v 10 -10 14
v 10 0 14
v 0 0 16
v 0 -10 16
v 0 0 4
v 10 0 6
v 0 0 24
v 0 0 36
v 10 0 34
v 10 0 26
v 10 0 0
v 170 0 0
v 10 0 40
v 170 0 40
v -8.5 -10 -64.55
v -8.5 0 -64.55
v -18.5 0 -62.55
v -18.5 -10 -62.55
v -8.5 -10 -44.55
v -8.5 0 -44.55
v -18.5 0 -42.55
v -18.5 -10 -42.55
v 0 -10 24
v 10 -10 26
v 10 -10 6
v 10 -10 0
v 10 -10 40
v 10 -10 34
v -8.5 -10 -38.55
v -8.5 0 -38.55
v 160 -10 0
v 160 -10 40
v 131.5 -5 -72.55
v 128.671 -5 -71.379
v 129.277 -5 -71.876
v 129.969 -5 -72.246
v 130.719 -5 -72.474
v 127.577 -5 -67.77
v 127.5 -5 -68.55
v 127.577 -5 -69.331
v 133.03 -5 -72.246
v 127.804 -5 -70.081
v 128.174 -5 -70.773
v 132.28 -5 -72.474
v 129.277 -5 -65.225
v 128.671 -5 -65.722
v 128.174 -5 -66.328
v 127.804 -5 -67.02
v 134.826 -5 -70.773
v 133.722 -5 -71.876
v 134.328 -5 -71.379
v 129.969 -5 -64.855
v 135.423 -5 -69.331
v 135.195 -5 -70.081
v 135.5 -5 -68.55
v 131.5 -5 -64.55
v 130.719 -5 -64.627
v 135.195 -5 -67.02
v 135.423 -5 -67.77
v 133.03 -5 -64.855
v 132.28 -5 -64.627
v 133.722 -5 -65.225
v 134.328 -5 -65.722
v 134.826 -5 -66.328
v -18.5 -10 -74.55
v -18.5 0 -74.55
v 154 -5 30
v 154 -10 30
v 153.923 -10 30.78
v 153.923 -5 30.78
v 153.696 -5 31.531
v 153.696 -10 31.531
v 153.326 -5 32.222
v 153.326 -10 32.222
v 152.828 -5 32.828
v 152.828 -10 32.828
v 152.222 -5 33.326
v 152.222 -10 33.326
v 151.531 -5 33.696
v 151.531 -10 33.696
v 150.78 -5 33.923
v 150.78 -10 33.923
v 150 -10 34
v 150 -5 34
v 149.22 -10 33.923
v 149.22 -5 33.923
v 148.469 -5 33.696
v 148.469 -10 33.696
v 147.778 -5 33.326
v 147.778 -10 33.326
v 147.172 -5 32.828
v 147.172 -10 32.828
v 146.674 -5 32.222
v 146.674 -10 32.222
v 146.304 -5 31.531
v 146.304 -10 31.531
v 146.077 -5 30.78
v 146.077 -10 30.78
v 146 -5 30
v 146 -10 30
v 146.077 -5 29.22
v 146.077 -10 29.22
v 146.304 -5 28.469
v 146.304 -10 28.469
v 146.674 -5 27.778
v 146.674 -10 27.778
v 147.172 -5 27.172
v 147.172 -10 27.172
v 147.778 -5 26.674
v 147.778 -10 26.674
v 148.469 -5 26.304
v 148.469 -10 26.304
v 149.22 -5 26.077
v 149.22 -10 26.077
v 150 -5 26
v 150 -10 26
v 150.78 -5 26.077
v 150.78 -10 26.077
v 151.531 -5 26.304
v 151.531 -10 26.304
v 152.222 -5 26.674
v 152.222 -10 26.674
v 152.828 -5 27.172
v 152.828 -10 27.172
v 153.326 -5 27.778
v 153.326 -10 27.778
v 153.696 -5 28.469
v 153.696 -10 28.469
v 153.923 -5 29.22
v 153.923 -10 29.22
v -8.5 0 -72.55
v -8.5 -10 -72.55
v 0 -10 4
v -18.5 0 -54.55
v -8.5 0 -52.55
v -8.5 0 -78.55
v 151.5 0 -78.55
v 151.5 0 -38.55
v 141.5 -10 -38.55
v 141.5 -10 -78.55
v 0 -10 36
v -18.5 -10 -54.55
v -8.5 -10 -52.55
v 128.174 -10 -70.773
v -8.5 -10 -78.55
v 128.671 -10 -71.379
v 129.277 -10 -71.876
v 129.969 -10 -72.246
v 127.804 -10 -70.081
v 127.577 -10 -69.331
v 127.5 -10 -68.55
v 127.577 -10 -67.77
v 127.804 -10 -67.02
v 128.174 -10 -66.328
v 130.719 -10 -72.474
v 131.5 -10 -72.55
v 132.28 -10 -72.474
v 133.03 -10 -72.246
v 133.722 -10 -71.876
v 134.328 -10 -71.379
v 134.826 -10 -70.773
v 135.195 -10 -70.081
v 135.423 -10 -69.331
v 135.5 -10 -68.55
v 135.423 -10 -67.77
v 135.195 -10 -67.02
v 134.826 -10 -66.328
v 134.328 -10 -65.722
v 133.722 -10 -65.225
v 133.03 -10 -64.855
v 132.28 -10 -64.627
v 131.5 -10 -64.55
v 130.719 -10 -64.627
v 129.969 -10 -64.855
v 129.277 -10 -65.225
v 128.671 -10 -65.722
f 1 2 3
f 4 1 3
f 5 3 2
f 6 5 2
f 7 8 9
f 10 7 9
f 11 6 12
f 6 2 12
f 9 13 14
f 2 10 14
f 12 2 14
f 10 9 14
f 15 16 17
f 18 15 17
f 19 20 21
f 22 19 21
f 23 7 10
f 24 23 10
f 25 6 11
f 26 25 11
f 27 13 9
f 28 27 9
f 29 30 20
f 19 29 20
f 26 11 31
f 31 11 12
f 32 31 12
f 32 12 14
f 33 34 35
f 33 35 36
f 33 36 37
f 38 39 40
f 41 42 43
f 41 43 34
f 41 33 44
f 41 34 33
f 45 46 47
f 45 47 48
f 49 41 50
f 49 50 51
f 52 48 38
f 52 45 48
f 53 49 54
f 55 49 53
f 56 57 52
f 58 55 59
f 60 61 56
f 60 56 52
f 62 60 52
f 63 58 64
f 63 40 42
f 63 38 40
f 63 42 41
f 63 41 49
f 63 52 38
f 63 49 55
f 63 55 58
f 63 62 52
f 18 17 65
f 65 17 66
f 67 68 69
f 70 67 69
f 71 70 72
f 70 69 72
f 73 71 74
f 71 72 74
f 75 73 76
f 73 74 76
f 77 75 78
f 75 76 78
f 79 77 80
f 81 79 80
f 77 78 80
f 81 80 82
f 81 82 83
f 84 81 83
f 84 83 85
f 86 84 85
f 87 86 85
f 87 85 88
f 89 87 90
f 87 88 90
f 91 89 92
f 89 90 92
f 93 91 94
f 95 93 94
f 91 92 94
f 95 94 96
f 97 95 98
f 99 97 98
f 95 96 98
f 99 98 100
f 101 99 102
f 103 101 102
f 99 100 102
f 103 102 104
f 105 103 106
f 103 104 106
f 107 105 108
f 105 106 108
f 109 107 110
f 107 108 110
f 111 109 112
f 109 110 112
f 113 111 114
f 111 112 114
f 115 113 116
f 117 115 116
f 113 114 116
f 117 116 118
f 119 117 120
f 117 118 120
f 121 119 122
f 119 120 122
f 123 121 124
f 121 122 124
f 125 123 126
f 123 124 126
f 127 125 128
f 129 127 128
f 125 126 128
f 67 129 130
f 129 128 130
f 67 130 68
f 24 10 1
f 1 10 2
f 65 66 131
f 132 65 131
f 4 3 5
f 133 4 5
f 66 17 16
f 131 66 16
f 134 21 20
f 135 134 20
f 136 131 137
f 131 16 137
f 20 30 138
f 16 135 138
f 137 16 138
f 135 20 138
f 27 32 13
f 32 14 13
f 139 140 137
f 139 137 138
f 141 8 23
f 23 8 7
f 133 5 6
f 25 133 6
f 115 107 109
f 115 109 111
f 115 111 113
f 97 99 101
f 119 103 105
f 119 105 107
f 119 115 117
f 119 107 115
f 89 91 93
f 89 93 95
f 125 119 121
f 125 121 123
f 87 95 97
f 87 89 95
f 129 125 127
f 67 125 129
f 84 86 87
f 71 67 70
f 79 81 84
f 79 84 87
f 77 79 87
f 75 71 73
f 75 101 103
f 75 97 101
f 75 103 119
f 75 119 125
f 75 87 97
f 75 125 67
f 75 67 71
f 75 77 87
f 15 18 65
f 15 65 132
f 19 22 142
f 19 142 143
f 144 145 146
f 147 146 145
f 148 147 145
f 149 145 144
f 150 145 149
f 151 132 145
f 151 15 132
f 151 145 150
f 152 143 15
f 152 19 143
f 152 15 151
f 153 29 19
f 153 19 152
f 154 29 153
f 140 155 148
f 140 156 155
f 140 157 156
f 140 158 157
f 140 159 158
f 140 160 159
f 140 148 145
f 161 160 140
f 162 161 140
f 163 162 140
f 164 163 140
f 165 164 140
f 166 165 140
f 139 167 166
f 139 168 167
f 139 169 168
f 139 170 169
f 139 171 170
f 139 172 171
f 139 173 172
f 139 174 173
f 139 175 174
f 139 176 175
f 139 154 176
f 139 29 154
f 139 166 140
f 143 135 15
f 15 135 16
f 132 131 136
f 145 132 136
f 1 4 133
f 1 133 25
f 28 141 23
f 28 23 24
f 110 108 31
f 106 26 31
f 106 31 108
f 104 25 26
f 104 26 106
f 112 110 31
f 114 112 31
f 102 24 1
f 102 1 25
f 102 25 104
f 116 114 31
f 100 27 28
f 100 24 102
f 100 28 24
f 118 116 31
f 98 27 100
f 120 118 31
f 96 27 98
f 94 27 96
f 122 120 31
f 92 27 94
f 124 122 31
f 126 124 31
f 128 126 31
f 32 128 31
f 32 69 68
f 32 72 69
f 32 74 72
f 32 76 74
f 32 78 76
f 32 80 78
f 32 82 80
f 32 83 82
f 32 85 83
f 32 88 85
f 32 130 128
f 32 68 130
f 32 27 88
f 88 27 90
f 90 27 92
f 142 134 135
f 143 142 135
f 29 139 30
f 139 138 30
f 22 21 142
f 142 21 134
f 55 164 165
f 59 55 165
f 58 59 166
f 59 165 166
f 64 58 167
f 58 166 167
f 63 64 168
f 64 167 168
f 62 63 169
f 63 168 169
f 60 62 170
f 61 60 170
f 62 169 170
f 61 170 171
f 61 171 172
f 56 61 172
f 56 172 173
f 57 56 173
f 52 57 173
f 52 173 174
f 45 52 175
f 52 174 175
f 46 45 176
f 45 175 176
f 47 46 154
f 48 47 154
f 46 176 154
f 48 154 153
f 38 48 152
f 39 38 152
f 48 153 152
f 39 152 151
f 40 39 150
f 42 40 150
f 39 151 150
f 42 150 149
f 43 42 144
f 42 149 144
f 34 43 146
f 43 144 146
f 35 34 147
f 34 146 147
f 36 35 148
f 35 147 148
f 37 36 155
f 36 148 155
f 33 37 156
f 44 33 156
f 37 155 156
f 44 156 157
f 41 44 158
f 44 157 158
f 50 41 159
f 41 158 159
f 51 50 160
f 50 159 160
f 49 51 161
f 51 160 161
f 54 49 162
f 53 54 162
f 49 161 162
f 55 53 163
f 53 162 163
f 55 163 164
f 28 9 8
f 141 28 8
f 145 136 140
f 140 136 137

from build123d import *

# Parameters (mm, degrees)
F1_DEPTH = 10
F2_SIZE  = 9.99999
F3_SIZE  = 9.99999
F4_R     = 4
F5_DEPTH = 5
F6_R     = 4
F7_DEPTH = 5


# Not quite as in the source:
# - a fillet or chamfer is up to 0.001 mm smaller than in the source, because OpenCascade refuses the exact size


with BuildPart() as f1:
    # F0 (on Front) → F1 (new body)
    with BuildSketch(Plane.XZ):
        Polygon((10, 6), (10, 0), (170, 0), (170, 40), (10, 40), (10, 34), (0, 36), (0, 24), (10, 26), (10, 14), (0, 16), (0, 4), align=None)
    extrude(amount=F1_DEPTH)

    # F2 (size 10 in the source; OpenCascade refuses exactly that, so slightly less here)
    f2_edges = [f1.edges().sort_by_distance(p)[0] for p in [
        (170, -10, 20),
    ]]
    chamfer(f2_edges, length=F2_SIZE)

    # F4 (on face) → F5 (cut)
    with BuildSketch(Plane.XZ.offset(10)):
        with Locations((150, 30)):
            Circle(F4_R)
    extrude(amount=-F5_DEPTH, mode=Mode.SUBTRACT)


with BuildPart() as f1b:
    # F0 (on Front) → F1, piece 2 (new body)
    with BuildSketch(Plane.XZ):
        Polygon((-8.5003077292, -72.550413698), (-8.5003077292, -78.550413698), (151.4996922708, -78.550413698), (151.4996922708, -38.550413698), (-8.5003077292, -38.550413698), (-8.5003077292, -44.550413698), (-18.5003077292, -42.550413698), (-18.5003077292, -54.550413698), (-8.5003077292, -52.550413698), (-8.5003077292, -64.550413698), (-18.5003077292, -62.550413698), (-18.5003077292, -74.550413698), align=None)
    extrude(amount=F1_DEPTH)

    # F3 (size 10 in the source; OpenCascade refuses exactly that, so slightly less here)
    f3_edges = [f1b.edges().sort_by_distance(p)[0] for p in [
        (151.499692, -10, -58.550414),
    ]]
    chamfer(f3_edges, length=F3_SIZE)

    # F6 (on face) → F7 (cut)
    with BuildSketch(Plane.XZ.offset(10)):
        with Locations((131.4996922708, -68.550413698)):
            Circle(F6_R)
    extrude(amount=-F7_DEPTH, mode=Mode.SUBTRACT)


solid = Compound([f1.part, f1b.part])
